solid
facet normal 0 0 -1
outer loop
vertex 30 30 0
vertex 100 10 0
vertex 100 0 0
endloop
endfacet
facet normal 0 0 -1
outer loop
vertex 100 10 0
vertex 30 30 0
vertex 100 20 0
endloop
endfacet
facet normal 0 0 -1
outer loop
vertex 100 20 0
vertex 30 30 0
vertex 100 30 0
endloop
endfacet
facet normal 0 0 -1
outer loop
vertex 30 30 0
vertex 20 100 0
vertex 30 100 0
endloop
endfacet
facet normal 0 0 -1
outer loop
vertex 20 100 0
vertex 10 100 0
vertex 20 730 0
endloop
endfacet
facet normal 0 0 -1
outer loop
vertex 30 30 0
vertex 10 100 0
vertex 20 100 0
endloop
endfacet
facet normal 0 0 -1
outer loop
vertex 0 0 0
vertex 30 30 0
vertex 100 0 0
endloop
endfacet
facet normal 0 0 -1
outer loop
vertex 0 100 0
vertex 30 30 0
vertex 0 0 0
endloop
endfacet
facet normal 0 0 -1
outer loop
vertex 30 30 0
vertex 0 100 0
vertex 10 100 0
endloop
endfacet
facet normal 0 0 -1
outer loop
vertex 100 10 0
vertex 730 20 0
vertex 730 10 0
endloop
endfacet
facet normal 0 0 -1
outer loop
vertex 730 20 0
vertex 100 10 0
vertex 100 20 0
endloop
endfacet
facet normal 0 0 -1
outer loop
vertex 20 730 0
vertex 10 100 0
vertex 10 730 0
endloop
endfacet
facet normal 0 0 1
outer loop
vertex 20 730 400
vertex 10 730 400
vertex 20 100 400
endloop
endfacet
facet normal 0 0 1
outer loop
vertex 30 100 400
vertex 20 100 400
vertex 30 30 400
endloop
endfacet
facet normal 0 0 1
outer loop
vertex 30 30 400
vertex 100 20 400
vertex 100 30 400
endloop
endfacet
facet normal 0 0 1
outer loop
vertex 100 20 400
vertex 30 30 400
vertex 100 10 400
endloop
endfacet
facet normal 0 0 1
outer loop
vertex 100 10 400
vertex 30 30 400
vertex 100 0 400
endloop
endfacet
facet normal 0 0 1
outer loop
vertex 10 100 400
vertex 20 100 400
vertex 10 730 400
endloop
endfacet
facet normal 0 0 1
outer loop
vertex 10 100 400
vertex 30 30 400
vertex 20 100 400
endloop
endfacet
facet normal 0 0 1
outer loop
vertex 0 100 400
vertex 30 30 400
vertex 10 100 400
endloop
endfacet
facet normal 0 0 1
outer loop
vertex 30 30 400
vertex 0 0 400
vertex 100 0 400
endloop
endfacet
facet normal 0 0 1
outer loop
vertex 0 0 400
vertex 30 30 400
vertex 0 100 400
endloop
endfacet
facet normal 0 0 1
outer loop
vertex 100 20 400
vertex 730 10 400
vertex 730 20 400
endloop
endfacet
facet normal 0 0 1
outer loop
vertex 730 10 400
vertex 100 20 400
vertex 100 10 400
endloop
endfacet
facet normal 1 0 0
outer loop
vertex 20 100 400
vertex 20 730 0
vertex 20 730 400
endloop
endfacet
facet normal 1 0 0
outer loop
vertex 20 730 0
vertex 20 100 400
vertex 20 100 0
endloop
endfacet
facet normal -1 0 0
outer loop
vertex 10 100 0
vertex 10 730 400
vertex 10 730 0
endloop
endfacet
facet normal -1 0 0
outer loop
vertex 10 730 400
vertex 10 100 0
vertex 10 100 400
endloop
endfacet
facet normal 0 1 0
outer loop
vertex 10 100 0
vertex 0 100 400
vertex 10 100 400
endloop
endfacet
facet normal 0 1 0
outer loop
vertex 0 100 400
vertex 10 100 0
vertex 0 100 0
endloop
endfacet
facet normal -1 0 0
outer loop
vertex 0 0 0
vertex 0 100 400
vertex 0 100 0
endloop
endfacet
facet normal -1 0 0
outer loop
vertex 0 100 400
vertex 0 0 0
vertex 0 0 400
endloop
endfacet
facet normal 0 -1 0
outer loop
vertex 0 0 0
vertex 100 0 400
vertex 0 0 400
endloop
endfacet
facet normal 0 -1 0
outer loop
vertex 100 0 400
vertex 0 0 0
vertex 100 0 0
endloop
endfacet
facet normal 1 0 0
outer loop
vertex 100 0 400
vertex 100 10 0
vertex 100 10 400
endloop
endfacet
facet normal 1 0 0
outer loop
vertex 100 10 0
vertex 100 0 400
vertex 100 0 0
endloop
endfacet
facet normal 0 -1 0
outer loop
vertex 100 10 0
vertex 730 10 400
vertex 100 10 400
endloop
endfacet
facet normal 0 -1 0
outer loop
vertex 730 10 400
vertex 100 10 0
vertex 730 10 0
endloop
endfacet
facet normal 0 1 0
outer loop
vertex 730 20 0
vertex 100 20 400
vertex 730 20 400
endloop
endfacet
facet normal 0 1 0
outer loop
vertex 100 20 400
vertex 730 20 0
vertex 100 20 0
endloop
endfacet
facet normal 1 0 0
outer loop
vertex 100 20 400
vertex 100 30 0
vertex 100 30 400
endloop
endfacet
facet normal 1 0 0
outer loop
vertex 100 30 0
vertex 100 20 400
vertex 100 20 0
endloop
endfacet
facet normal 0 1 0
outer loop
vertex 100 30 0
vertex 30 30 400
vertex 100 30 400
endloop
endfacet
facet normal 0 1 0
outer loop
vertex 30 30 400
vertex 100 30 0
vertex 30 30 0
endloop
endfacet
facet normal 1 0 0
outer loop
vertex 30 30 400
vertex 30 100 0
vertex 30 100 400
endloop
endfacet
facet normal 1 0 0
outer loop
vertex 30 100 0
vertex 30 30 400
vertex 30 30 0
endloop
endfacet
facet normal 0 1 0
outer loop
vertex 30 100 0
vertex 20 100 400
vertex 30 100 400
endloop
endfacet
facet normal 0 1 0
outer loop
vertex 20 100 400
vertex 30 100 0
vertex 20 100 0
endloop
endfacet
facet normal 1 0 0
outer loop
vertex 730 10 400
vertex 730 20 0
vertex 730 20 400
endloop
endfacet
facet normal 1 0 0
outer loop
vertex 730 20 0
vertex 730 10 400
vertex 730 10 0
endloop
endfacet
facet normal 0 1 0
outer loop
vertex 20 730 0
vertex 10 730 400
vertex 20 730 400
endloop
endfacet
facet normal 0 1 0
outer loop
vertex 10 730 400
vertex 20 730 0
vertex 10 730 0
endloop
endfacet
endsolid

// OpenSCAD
h = 100; // larghezza spalla binario
s = 10; // spessore bordi binario
spess = 10; // spessore lastra plexiglass
height = 400; // altezza binario e plexiglass
length = 700; // lunghezza lastra plexiglass

linear_extrude(height = height){
polygon(points=[[0,0],[h,0],[h,s],[s+spess+s,s],[s+spess+s,s+spess],
[h,s+spess],[h,s+spess+s],[s+spess+s,s+spess+s]]);
mirror([1,0,0])
rotate([0,0,90])
polygon(points=[[0,0],[h,0],[h,s],[s+spess+s,s],[s+spess+s,s+spess],
[h,s+spess],[h,s+spess+s],[s+spess+s,s+spess+s]]);}


// lastra plexiglass

module lastra(colore="green", trasparenza=0.5) {
    color(colore, alpha=trasparenza)
        cube([length,  spess, height]);
}

translate([s+spess+s,s,0])
lastra();
translate([s+spess,s+s+spess,0])
rotate([0,0,90])
lastra();
